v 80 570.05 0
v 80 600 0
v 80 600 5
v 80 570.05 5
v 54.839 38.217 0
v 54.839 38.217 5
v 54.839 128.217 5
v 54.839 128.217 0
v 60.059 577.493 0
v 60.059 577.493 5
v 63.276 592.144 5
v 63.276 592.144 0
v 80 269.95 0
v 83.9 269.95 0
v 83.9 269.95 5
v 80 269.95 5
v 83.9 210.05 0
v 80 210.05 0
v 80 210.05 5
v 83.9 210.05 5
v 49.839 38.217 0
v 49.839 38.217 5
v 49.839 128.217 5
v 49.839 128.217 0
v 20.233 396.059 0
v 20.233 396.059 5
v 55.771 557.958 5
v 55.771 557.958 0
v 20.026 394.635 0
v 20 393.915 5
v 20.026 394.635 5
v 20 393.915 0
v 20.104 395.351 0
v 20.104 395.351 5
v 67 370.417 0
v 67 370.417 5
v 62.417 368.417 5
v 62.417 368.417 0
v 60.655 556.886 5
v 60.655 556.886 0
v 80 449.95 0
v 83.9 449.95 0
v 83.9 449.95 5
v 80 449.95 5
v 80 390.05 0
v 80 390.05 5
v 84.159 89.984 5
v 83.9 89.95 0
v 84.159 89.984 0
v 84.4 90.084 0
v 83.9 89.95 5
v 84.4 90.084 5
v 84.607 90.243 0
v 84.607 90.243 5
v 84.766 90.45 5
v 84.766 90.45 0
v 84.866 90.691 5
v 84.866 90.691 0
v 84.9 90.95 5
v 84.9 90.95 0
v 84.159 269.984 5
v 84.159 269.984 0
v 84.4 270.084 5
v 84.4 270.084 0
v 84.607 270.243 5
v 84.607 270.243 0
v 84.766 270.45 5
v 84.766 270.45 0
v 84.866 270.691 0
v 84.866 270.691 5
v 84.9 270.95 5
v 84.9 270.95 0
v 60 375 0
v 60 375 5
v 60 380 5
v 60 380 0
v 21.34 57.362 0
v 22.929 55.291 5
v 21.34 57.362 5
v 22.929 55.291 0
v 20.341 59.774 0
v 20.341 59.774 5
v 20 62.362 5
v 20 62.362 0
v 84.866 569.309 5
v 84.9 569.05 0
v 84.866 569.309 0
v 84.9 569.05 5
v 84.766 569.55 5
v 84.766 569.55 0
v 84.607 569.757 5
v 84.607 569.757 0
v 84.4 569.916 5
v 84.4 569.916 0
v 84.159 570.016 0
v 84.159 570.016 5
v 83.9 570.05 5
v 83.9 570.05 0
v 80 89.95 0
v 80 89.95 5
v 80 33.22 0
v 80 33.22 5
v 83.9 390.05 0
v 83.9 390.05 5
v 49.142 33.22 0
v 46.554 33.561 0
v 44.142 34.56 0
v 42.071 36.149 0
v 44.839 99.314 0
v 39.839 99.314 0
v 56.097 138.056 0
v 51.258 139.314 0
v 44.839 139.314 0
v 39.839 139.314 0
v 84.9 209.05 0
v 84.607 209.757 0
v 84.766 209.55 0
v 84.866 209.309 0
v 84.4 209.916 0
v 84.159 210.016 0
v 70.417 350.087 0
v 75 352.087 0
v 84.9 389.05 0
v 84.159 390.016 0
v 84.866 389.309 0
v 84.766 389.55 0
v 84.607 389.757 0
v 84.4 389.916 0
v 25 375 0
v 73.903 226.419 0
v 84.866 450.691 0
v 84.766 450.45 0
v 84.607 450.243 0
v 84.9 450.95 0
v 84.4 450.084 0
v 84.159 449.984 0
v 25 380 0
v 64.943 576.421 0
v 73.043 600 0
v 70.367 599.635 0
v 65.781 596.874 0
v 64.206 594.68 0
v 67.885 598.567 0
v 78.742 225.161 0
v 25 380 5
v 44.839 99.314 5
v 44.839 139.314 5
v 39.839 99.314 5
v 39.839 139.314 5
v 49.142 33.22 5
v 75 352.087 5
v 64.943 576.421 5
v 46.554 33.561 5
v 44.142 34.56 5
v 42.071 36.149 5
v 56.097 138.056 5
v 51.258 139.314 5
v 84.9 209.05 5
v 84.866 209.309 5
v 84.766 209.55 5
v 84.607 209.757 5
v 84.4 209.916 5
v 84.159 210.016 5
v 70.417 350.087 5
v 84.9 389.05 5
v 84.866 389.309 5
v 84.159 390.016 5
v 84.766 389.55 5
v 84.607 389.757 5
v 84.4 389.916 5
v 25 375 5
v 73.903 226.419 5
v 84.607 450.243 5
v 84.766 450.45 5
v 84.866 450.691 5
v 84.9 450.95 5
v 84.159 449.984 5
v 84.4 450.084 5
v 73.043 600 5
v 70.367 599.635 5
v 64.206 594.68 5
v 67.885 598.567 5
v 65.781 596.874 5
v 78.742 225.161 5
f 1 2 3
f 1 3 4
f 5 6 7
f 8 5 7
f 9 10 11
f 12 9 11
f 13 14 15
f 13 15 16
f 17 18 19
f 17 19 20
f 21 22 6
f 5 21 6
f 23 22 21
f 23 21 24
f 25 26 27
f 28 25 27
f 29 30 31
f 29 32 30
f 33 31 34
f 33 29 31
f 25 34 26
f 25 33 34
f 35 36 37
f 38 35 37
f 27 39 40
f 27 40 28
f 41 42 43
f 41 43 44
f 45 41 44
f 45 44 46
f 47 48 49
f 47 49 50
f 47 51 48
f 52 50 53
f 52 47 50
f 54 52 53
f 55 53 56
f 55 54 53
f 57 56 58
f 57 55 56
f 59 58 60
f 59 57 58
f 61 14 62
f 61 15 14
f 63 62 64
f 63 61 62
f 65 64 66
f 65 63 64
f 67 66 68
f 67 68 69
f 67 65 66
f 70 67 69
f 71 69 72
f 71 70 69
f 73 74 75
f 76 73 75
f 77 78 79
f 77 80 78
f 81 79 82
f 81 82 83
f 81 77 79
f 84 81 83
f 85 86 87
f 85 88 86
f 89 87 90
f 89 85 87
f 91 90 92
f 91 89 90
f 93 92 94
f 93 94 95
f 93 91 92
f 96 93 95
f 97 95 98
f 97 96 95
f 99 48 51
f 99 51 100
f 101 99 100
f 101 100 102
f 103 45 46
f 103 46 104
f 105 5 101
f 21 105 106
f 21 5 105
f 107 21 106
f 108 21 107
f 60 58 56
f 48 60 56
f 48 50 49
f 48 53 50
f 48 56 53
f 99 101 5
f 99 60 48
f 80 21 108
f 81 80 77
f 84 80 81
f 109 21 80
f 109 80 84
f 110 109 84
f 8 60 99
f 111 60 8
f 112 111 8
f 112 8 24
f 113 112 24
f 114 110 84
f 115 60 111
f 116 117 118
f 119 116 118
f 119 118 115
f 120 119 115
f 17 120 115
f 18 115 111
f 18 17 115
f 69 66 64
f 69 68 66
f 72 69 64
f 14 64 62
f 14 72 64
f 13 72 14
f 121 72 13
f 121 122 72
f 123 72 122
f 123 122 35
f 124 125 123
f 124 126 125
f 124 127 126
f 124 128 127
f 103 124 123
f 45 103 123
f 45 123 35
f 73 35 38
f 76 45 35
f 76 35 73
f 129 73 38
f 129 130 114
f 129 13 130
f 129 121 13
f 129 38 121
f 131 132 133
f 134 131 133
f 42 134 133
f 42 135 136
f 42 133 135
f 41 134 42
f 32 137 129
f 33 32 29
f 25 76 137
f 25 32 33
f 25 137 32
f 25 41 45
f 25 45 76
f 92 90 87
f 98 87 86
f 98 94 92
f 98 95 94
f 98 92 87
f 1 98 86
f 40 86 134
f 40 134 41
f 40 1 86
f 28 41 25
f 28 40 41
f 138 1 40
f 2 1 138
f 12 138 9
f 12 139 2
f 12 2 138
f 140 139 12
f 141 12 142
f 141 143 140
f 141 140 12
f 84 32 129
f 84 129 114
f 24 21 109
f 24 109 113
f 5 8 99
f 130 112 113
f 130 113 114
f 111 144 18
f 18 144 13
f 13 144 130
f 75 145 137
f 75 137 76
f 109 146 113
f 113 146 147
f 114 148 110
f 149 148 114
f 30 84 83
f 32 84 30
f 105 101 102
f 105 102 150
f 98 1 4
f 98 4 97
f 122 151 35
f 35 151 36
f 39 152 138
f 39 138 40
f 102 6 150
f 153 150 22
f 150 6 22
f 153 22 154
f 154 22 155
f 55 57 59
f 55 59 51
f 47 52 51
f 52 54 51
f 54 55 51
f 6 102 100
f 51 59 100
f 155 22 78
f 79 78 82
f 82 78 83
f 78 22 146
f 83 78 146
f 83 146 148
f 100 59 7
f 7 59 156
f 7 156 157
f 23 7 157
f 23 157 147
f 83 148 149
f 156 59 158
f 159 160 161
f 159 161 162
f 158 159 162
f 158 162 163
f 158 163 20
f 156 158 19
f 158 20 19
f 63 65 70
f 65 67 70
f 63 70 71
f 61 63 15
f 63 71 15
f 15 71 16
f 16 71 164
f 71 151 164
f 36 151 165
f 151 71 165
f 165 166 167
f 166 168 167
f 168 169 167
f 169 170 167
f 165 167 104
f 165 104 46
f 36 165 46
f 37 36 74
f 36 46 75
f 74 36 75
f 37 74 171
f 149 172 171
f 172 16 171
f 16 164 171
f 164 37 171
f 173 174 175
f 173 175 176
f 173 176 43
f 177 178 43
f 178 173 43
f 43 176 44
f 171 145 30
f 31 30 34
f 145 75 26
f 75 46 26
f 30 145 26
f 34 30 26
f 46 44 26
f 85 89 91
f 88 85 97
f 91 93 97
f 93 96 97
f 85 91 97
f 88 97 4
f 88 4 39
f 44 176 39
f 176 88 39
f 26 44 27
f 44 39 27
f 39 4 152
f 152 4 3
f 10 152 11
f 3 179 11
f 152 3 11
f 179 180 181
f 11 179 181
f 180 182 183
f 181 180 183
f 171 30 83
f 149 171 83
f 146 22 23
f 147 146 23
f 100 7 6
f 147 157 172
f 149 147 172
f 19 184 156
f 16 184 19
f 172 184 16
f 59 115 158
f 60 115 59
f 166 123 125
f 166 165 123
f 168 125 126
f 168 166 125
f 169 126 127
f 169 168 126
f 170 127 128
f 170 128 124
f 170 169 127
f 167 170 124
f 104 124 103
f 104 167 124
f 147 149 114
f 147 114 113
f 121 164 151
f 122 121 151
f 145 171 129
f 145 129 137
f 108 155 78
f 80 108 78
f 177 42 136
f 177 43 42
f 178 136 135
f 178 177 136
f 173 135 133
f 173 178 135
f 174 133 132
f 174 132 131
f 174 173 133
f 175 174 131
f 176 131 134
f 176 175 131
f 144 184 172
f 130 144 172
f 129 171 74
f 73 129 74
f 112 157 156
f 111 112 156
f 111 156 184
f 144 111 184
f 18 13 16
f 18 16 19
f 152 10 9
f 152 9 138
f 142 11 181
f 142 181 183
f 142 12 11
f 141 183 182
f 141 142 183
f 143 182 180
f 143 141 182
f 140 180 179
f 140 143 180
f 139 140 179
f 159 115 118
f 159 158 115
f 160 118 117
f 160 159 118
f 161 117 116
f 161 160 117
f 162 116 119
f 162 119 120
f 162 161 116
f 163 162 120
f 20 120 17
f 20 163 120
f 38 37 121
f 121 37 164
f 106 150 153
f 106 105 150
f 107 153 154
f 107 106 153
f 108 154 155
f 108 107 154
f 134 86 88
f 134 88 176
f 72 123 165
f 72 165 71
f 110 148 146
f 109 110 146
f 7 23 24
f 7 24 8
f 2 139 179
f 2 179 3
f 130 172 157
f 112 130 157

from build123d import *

# Parameters (mm, degrees)
BOSS_EXTRUDE1_DEPTH = 5
SKETCH2_W           = 5
SKETCH2_H           = 90
SKETCH2_H_2         = 40
SKETCH2_W_2         = 35
SKETCH2_H_3         = 5
CUT_EXTRUDE1_DEPTH  = 10
CUT_EXTRUDE2_DEPTH  = 10
FILLET1_R           = 1
FILLET2_R           = 10
CUT_EXTRUDE3_DEPTH  = 10


with BuildPart() as part:
    # Sketch1 → Boss-Extrude1 (new body)
    with BuildSketch(Plane.XY):
        Polygon((80, 33.22), (20, 33.22), (20, 600), (80, 600), (80, 570.05), (84.9, 570.05), (84.9, 449.95), (80, 449.95), (80, 390.05), (84.9, 390.05), (84.9, 269.95), (80, 269.95), (80, 210.05), (84.9, 210.05), (84.9, 89.95), (80, 89.95), align=None)
    extrude(amount=BOSS_EXTRUDE1_DEPTH)

    # Sketch2 → Cut-Extrude1 (cut)
    with BuildSketch(Plane.XY.offset(5)):
        Polygon((67, 370.417424305), (62.417424305, 368.417424305), (70.417424305, 350.087121525), (75, 352.087121525), align=None)
        Polygon((73.902811841, 226.418897298), (51.258042728, 139.314279557), (56.097188159, 138.056236829), (78.741957272, 225.16085457), align=None)
        with Locations((52.33914543, 83.217091399)):
            Rectangle(SKETCH2_W, SKETCH2_H)
        with Locations((42.33914543, 119.314279557)):
            Rectangle(SKETCH2_W, SKETCH2_H_2)
        with Locations((42.5, 377.5)):
            Rectangle(SKETCH2_W_2, SKETCH2_H_3)
    extrude(amount=-CUT_EXTRUDE1_DEPTH, mode=Mode.SUBTRACT)

    # Sketch3 → Cut-Extrude2 (cut)
    with BuildSketch(Plane.XY.offset(5)):
        Polygon((20, 395), (65, 600), (1.513631165, 616.08755832), align=None)
        Polygon((45, 33.22), (20, 58.22), (13.452472792, 20.556075169), align=None)
    extrude(amount=-CUT_EXTRUDE2_DEPTH, mode=Mode.SUBTRACT)

    # Fillet1
    fillet1_edges = [part.edges().sort_by_distance(p)[0] for p in [
        (84.9, 570.05, 2.5),
        (84.9, 449.95, 2.5),
        (84.9, 390.05, 2.5),
        (84.9, 269.95, 2.5),
        (84.9, 210.05, 2.5),
        (84.9, 89.95, 2.5),
    ]]
    fillet(fillet1_edges, radius=FILLET1_R)

    # Fillet2
    fillet2_edges = [part.edges().sort_by_distance(p)[0] for p in [
        (20, 395, 2.5),
        (65, 600, 2.5),
        (45, 33.22, 2.5),
        (20, 58.22, 2.5),
    ]]
    fillet(fillet2_edges, radius=FILLET2_R)

    # Sketch4 → Cut-Extrude3 (cut)
    with BuildSketch(Plane.XY.offset(5)):
        Polygon((60.059418786, 577.492907801), (64.943140501, 576.420871327), (60.654994605, 556.885984463), (55.771272889, 557.958020937), align=None)
    extrude(amount=-CUT_EXTRUDE3_DEPTH, mode=Mode.SUBTRACT)


solid = part.part
